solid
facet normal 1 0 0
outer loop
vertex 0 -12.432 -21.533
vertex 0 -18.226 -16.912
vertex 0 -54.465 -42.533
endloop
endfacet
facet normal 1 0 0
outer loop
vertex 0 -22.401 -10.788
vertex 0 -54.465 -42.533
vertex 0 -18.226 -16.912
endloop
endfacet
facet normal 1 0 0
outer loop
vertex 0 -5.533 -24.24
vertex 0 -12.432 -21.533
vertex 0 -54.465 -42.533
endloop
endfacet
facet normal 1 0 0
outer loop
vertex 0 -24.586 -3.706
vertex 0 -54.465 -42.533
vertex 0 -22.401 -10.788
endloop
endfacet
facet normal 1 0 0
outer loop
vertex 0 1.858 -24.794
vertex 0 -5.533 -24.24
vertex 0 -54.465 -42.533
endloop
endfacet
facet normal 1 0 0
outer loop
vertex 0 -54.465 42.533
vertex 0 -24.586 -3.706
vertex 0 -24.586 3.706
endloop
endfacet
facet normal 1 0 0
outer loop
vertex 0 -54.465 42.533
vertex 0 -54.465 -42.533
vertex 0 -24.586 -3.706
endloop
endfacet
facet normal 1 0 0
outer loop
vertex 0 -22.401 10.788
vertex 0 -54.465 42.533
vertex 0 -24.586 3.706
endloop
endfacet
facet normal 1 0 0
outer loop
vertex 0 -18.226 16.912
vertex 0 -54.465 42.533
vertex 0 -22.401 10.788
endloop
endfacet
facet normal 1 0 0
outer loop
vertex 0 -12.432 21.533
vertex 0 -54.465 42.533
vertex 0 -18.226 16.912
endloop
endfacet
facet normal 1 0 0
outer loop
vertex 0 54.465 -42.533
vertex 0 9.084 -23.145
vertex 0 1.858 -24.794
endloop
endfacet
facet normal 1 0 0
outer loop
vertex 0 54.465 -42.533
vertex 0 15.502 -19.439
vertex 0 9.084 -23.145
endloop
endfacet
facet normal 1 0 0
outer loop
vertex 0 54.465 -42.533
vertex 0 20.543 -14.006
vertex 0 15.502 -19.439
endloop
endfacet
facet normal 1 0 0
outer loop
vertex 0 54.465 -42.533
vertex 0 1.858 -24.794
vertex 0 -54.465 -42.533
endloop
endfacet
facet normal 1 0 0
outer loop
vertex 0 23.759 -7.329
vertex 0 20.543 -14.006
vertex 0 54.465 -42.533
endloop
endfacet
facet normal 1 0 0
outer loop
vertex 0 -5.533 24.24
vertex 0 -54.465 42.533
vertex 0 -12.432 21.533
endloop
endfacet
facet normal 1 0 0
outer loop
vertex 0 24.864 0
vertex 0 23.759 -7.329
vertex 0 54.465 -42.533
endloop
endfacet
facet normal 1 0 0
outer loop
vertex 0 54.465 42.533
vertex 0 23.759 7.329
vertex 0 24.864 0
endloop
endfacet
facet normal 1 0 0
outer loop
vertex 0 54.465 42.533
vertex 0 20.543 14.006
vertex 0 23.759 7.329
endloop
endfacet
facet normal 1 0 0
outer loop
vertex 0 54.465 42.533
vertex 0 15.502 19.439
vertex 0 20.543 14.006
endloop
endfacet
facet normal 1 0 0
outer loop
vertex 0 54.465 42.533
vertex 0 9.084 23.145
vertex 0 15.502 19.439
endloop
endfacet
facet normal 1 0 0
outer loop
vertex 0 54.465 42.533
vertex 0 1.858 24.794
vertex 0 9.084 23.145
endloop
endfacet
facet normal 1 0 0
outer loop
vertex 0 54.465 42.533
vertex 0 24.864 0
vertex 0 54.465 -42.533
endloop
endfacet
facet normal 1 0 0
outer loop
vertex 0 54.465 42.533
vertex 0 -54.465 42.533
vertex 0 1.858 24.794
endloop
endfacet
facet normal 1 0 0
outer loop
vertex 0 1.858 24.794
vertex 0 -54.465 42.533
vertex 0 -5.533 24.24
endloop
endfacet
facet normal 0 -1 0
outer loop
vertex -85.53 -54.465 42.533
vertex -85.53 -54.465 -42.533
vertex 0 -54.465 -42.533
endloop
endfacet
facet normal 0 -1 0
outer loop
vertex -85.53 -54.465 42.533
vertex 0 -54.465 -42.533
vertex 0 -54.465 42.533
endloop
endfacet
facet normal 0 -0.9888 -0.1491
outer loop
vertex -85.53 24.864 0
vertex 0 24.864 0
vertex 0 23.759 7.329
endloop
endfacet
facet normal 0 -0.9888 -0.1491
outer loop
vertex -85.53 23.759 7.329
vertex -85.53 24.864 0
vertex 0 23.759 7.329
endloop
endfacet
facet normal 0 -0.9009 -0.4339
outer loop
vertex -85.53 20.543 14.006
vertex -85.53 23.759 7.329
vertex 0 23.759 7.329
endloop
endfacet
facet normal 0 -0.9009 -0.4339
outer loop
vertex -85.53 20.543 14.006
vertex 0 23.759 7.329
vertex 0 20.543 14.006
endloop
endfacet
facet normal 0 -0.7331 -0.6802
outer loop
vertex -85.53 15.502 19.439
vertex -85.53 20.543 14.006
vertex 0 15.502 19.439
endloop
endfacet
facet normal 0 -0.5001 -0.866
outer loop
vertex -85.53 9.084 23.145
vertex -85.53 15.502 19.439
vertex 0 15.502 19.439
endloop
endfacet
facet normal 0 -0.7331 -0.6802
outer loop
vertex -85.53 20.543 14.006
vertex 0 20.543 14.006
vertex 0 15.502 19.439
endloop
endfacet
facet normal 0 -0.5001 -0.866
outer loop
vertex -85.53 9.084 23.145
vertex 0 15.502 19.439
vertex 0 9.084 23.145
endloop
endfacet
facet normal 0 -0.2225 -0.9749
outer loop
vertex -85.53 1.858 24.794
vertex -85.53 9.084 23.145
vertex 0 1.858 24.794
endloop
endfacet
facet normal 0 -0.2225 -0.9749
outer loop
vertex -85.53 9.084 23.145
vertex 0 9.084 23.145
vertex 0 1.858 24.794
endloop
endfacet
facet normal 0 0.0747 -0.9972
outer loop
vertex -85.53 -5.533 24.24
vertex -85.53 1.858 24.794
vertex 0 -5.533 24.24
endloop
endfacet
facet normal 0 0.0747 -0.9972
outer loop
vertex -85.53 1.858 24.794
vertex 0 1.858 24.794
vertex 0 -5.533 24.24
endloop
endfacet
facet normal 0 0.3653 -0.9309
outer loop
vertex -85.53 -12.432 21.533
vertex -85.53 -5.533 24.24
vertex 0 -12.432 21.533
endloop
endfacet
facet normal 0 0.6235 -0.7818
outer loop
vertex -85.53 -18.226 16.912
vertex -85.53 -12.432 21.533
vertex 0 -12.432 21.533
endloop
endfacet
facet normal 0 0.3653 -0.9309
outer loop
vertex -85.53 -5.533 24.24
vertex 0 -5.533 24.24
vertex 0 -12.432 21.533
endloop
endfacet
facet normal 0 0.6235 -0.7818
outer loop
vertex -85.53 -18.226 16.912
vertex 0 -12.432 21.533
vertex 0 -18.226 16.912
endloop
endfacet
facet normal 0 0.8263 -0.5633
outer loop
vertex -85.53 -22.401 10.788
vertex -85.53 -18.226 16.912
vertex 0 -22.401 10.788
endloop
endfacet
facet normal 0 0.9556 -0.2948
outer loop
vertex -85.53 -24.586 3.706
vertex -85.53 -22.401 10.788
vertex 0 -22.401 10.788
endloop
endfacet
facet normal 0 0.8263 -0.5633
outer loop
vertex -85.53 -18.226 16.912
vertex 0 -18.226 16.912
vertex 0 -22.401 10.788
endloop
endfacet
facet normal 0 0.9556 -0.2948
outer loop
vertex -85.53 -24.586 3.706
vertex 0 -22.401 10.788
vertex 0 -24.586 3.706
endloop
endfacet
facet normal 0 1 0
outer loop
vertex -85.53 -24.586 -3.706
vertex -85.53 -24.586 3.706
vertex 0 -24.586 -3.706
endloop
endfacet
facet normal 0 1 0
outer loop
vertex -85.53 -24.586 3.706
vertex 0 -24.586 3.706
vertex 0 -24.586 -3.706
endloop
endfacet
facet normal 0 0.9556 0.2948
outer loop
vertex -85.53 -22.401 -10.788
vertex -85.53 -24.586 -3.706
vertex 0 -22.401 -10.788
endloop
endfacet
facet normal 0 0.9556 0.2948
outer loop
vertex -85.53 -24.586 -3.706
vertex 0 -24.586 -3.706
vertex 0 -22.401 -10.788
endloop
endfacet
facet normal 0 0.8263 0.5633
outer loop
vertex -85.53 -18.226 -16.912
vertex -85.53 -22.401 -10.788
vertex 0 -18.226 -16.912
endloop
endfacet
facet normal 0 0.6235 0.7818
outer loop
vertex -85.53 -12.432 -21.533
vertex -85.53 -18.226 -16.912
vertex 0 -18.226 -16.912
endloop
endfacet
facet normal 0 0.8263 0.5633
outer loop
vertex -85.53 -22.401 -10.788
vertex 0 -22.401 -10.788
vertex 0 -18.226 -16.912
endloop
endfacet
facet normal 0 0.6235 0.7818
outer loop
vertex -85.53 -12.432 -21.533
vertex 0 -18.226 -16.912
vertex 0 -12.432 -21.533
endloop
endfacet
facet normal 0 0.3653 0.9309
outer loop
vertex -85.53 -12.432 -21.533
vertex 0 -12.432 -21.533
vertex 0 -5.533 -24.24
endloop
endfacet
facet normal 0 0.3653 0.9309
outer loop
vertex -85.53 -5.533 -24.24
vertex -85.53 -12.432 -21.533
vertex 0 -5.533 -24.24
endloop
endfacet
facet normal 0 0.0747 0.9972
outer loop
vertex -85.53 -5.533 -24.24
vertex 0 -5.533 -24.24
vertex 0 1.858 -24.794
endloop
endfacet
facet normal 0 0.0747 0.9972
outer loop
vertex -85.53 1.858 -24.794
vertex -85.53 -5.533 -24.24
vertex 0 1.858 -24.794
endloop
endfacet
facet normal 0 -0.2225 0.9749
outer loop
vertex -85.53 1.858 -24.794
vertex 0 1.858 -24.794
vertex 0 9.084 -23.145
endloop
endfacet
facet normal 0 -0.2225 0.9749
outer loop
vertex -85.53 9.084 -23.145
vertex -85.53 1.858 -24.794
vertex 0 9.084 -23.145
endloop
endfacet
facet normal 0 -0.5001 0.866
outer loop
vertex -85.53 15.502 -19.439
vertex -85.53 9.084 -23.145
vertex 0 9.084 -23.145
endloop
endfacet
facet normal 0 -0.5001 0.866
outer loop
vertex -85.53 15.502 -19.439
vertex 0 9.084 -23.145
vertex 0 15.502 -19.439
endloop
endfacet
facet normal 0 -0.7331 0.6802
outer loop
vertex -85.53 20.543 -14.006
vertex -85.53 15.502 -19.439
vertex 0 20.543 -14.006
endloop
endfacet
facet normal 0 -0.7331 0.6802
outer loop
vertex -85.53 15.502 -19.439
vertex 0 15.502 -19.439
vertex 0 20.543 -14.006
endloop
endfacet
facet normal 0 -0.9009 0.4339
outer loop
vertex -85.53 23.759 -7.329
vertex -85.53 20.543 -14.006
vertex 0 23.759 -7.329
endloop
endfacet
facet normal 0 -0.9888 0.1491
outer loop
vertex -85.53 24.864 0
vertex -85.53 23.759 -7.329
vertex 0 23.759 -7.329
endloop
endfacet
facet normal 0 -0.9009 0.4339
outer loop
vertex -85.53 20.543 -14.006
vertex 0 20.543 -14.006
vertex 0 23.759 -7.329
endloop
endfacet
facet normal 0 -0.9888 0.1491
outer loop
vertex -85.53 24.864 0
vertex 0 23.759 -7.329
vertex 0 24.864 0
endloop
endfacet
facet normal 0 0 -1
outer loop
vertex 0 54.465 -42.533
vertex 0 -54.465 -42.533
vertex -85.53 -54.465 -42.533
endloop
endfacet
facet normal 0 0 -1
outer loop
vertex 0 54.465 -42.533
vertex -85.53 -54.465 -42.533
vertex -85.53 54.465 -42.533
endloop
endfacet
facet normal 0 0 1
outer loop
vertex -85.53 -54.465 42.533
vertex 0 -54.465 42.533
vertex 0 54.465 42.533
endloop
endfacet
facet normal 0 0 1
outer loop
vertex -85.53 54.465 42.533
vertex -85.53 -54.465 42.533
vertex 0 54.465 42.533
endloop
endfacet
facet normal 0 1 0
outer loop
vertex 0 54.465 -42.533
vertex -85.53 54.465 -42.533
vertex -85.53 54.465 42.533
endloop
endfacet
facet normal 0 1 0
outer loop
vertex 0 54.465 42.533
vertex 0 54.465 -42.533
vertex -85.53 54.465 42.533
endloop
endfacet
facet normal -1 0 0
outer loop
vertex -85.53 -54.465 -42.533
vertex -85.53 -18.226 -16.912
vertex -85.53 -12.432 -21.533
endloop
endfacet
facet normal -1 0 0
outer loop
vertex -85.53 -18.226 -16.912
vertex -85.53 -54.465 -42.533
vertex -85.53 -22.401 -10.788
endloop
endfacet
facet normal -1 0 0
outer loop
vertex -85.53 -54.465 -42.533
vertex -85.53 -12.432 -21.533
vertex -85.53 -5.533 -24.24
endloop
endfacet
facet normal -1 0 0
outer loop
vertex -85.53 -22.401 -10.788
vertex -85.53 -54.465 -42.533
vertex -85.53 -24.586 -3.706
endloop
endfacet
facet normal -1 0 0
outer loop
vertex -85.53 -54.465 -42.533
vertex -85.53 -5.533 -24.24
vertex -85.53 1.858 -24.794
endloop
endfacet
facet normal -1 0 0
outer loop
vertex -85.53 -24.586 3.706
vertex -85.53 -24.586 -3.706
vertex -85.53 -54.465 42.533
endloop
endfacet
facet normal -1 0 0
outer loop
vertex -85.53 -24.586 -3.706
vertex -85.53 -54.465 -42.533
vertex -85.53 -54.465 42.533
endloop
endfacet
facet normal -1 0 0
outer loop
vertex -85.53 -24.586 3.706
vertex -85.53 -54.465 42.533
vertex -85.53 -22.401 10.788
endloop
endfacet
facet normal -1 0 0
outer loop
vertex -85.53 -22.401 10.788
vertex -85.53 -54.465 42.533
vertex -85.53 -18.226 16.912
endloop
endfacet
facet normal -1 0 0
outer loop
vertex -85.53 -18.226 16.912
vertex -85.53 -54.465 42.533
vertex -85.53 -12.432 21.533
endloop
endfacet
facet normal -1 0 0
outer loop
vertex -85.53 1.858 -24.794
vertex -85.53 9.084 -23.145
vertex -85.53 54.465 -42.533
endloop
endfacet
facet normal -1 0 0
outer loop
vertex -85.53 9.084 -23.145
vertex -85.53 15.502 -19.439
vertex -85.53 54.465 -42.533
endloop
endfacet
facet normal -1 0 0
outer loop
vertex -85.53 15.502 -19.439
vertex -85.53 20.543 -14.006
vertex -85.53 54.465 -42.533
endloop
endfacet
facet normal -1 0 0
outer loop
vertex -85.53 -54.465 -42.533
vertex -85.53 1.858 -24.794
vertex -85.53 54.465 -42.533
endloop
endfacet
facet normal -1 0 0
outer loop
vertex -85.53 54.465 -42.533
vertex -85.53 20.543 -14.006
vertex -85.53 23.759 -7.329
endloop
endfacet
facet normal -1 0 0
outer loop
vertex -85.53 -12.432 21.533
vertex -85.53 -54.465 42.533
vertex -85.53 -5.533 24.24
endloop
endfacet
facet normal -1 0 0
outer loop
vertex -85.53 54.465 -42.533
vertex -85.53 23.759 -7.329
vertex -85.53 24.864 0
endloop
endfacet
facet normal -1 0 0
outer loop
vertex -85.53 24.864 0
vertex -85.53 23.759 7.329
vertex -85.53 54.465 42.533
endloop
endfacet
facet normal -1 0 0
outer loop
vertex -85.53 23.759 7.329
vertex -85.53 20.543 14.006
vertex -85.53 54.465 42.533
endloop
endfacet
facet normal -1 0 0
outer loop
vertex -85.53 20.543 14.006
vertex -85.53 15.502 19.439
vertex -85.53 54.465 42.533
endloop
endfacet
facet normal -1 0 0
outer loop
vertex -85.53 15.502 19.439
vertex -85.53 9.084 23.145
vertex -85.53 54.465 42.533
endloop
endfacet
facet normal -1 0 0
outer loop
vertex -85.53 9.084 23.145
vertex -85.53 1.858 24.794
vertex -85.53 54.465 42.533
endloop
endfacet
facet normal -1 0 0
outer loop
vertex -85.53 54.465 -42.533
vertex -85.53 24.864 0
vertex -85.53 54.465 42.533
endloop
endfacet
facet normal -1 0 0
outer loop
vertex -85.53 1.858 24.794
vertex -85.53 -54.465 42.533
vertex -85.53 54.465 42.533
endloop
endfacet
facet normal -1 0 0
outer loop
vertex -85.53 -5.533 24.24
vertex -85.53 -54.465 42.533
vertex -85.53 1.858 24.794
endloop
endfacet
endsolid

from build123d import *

# Parameters (mm, degrees)
F0_W     = 108.930484
F0_H     = 85.066848
F0_R     = 24.8637
F1_DEPTH = 85.53001


with BuildPart() as f1:
    # F0 (on Right) → F1 (new body)
    with BuildSketch(Plane.YZ):
        Rectangle(F0_W, F0_H)
        Circle(F0_R, mode=Mode.SUBTRACT)
    extrude(amount=-F1_DEPTH)


solid = f1.part
